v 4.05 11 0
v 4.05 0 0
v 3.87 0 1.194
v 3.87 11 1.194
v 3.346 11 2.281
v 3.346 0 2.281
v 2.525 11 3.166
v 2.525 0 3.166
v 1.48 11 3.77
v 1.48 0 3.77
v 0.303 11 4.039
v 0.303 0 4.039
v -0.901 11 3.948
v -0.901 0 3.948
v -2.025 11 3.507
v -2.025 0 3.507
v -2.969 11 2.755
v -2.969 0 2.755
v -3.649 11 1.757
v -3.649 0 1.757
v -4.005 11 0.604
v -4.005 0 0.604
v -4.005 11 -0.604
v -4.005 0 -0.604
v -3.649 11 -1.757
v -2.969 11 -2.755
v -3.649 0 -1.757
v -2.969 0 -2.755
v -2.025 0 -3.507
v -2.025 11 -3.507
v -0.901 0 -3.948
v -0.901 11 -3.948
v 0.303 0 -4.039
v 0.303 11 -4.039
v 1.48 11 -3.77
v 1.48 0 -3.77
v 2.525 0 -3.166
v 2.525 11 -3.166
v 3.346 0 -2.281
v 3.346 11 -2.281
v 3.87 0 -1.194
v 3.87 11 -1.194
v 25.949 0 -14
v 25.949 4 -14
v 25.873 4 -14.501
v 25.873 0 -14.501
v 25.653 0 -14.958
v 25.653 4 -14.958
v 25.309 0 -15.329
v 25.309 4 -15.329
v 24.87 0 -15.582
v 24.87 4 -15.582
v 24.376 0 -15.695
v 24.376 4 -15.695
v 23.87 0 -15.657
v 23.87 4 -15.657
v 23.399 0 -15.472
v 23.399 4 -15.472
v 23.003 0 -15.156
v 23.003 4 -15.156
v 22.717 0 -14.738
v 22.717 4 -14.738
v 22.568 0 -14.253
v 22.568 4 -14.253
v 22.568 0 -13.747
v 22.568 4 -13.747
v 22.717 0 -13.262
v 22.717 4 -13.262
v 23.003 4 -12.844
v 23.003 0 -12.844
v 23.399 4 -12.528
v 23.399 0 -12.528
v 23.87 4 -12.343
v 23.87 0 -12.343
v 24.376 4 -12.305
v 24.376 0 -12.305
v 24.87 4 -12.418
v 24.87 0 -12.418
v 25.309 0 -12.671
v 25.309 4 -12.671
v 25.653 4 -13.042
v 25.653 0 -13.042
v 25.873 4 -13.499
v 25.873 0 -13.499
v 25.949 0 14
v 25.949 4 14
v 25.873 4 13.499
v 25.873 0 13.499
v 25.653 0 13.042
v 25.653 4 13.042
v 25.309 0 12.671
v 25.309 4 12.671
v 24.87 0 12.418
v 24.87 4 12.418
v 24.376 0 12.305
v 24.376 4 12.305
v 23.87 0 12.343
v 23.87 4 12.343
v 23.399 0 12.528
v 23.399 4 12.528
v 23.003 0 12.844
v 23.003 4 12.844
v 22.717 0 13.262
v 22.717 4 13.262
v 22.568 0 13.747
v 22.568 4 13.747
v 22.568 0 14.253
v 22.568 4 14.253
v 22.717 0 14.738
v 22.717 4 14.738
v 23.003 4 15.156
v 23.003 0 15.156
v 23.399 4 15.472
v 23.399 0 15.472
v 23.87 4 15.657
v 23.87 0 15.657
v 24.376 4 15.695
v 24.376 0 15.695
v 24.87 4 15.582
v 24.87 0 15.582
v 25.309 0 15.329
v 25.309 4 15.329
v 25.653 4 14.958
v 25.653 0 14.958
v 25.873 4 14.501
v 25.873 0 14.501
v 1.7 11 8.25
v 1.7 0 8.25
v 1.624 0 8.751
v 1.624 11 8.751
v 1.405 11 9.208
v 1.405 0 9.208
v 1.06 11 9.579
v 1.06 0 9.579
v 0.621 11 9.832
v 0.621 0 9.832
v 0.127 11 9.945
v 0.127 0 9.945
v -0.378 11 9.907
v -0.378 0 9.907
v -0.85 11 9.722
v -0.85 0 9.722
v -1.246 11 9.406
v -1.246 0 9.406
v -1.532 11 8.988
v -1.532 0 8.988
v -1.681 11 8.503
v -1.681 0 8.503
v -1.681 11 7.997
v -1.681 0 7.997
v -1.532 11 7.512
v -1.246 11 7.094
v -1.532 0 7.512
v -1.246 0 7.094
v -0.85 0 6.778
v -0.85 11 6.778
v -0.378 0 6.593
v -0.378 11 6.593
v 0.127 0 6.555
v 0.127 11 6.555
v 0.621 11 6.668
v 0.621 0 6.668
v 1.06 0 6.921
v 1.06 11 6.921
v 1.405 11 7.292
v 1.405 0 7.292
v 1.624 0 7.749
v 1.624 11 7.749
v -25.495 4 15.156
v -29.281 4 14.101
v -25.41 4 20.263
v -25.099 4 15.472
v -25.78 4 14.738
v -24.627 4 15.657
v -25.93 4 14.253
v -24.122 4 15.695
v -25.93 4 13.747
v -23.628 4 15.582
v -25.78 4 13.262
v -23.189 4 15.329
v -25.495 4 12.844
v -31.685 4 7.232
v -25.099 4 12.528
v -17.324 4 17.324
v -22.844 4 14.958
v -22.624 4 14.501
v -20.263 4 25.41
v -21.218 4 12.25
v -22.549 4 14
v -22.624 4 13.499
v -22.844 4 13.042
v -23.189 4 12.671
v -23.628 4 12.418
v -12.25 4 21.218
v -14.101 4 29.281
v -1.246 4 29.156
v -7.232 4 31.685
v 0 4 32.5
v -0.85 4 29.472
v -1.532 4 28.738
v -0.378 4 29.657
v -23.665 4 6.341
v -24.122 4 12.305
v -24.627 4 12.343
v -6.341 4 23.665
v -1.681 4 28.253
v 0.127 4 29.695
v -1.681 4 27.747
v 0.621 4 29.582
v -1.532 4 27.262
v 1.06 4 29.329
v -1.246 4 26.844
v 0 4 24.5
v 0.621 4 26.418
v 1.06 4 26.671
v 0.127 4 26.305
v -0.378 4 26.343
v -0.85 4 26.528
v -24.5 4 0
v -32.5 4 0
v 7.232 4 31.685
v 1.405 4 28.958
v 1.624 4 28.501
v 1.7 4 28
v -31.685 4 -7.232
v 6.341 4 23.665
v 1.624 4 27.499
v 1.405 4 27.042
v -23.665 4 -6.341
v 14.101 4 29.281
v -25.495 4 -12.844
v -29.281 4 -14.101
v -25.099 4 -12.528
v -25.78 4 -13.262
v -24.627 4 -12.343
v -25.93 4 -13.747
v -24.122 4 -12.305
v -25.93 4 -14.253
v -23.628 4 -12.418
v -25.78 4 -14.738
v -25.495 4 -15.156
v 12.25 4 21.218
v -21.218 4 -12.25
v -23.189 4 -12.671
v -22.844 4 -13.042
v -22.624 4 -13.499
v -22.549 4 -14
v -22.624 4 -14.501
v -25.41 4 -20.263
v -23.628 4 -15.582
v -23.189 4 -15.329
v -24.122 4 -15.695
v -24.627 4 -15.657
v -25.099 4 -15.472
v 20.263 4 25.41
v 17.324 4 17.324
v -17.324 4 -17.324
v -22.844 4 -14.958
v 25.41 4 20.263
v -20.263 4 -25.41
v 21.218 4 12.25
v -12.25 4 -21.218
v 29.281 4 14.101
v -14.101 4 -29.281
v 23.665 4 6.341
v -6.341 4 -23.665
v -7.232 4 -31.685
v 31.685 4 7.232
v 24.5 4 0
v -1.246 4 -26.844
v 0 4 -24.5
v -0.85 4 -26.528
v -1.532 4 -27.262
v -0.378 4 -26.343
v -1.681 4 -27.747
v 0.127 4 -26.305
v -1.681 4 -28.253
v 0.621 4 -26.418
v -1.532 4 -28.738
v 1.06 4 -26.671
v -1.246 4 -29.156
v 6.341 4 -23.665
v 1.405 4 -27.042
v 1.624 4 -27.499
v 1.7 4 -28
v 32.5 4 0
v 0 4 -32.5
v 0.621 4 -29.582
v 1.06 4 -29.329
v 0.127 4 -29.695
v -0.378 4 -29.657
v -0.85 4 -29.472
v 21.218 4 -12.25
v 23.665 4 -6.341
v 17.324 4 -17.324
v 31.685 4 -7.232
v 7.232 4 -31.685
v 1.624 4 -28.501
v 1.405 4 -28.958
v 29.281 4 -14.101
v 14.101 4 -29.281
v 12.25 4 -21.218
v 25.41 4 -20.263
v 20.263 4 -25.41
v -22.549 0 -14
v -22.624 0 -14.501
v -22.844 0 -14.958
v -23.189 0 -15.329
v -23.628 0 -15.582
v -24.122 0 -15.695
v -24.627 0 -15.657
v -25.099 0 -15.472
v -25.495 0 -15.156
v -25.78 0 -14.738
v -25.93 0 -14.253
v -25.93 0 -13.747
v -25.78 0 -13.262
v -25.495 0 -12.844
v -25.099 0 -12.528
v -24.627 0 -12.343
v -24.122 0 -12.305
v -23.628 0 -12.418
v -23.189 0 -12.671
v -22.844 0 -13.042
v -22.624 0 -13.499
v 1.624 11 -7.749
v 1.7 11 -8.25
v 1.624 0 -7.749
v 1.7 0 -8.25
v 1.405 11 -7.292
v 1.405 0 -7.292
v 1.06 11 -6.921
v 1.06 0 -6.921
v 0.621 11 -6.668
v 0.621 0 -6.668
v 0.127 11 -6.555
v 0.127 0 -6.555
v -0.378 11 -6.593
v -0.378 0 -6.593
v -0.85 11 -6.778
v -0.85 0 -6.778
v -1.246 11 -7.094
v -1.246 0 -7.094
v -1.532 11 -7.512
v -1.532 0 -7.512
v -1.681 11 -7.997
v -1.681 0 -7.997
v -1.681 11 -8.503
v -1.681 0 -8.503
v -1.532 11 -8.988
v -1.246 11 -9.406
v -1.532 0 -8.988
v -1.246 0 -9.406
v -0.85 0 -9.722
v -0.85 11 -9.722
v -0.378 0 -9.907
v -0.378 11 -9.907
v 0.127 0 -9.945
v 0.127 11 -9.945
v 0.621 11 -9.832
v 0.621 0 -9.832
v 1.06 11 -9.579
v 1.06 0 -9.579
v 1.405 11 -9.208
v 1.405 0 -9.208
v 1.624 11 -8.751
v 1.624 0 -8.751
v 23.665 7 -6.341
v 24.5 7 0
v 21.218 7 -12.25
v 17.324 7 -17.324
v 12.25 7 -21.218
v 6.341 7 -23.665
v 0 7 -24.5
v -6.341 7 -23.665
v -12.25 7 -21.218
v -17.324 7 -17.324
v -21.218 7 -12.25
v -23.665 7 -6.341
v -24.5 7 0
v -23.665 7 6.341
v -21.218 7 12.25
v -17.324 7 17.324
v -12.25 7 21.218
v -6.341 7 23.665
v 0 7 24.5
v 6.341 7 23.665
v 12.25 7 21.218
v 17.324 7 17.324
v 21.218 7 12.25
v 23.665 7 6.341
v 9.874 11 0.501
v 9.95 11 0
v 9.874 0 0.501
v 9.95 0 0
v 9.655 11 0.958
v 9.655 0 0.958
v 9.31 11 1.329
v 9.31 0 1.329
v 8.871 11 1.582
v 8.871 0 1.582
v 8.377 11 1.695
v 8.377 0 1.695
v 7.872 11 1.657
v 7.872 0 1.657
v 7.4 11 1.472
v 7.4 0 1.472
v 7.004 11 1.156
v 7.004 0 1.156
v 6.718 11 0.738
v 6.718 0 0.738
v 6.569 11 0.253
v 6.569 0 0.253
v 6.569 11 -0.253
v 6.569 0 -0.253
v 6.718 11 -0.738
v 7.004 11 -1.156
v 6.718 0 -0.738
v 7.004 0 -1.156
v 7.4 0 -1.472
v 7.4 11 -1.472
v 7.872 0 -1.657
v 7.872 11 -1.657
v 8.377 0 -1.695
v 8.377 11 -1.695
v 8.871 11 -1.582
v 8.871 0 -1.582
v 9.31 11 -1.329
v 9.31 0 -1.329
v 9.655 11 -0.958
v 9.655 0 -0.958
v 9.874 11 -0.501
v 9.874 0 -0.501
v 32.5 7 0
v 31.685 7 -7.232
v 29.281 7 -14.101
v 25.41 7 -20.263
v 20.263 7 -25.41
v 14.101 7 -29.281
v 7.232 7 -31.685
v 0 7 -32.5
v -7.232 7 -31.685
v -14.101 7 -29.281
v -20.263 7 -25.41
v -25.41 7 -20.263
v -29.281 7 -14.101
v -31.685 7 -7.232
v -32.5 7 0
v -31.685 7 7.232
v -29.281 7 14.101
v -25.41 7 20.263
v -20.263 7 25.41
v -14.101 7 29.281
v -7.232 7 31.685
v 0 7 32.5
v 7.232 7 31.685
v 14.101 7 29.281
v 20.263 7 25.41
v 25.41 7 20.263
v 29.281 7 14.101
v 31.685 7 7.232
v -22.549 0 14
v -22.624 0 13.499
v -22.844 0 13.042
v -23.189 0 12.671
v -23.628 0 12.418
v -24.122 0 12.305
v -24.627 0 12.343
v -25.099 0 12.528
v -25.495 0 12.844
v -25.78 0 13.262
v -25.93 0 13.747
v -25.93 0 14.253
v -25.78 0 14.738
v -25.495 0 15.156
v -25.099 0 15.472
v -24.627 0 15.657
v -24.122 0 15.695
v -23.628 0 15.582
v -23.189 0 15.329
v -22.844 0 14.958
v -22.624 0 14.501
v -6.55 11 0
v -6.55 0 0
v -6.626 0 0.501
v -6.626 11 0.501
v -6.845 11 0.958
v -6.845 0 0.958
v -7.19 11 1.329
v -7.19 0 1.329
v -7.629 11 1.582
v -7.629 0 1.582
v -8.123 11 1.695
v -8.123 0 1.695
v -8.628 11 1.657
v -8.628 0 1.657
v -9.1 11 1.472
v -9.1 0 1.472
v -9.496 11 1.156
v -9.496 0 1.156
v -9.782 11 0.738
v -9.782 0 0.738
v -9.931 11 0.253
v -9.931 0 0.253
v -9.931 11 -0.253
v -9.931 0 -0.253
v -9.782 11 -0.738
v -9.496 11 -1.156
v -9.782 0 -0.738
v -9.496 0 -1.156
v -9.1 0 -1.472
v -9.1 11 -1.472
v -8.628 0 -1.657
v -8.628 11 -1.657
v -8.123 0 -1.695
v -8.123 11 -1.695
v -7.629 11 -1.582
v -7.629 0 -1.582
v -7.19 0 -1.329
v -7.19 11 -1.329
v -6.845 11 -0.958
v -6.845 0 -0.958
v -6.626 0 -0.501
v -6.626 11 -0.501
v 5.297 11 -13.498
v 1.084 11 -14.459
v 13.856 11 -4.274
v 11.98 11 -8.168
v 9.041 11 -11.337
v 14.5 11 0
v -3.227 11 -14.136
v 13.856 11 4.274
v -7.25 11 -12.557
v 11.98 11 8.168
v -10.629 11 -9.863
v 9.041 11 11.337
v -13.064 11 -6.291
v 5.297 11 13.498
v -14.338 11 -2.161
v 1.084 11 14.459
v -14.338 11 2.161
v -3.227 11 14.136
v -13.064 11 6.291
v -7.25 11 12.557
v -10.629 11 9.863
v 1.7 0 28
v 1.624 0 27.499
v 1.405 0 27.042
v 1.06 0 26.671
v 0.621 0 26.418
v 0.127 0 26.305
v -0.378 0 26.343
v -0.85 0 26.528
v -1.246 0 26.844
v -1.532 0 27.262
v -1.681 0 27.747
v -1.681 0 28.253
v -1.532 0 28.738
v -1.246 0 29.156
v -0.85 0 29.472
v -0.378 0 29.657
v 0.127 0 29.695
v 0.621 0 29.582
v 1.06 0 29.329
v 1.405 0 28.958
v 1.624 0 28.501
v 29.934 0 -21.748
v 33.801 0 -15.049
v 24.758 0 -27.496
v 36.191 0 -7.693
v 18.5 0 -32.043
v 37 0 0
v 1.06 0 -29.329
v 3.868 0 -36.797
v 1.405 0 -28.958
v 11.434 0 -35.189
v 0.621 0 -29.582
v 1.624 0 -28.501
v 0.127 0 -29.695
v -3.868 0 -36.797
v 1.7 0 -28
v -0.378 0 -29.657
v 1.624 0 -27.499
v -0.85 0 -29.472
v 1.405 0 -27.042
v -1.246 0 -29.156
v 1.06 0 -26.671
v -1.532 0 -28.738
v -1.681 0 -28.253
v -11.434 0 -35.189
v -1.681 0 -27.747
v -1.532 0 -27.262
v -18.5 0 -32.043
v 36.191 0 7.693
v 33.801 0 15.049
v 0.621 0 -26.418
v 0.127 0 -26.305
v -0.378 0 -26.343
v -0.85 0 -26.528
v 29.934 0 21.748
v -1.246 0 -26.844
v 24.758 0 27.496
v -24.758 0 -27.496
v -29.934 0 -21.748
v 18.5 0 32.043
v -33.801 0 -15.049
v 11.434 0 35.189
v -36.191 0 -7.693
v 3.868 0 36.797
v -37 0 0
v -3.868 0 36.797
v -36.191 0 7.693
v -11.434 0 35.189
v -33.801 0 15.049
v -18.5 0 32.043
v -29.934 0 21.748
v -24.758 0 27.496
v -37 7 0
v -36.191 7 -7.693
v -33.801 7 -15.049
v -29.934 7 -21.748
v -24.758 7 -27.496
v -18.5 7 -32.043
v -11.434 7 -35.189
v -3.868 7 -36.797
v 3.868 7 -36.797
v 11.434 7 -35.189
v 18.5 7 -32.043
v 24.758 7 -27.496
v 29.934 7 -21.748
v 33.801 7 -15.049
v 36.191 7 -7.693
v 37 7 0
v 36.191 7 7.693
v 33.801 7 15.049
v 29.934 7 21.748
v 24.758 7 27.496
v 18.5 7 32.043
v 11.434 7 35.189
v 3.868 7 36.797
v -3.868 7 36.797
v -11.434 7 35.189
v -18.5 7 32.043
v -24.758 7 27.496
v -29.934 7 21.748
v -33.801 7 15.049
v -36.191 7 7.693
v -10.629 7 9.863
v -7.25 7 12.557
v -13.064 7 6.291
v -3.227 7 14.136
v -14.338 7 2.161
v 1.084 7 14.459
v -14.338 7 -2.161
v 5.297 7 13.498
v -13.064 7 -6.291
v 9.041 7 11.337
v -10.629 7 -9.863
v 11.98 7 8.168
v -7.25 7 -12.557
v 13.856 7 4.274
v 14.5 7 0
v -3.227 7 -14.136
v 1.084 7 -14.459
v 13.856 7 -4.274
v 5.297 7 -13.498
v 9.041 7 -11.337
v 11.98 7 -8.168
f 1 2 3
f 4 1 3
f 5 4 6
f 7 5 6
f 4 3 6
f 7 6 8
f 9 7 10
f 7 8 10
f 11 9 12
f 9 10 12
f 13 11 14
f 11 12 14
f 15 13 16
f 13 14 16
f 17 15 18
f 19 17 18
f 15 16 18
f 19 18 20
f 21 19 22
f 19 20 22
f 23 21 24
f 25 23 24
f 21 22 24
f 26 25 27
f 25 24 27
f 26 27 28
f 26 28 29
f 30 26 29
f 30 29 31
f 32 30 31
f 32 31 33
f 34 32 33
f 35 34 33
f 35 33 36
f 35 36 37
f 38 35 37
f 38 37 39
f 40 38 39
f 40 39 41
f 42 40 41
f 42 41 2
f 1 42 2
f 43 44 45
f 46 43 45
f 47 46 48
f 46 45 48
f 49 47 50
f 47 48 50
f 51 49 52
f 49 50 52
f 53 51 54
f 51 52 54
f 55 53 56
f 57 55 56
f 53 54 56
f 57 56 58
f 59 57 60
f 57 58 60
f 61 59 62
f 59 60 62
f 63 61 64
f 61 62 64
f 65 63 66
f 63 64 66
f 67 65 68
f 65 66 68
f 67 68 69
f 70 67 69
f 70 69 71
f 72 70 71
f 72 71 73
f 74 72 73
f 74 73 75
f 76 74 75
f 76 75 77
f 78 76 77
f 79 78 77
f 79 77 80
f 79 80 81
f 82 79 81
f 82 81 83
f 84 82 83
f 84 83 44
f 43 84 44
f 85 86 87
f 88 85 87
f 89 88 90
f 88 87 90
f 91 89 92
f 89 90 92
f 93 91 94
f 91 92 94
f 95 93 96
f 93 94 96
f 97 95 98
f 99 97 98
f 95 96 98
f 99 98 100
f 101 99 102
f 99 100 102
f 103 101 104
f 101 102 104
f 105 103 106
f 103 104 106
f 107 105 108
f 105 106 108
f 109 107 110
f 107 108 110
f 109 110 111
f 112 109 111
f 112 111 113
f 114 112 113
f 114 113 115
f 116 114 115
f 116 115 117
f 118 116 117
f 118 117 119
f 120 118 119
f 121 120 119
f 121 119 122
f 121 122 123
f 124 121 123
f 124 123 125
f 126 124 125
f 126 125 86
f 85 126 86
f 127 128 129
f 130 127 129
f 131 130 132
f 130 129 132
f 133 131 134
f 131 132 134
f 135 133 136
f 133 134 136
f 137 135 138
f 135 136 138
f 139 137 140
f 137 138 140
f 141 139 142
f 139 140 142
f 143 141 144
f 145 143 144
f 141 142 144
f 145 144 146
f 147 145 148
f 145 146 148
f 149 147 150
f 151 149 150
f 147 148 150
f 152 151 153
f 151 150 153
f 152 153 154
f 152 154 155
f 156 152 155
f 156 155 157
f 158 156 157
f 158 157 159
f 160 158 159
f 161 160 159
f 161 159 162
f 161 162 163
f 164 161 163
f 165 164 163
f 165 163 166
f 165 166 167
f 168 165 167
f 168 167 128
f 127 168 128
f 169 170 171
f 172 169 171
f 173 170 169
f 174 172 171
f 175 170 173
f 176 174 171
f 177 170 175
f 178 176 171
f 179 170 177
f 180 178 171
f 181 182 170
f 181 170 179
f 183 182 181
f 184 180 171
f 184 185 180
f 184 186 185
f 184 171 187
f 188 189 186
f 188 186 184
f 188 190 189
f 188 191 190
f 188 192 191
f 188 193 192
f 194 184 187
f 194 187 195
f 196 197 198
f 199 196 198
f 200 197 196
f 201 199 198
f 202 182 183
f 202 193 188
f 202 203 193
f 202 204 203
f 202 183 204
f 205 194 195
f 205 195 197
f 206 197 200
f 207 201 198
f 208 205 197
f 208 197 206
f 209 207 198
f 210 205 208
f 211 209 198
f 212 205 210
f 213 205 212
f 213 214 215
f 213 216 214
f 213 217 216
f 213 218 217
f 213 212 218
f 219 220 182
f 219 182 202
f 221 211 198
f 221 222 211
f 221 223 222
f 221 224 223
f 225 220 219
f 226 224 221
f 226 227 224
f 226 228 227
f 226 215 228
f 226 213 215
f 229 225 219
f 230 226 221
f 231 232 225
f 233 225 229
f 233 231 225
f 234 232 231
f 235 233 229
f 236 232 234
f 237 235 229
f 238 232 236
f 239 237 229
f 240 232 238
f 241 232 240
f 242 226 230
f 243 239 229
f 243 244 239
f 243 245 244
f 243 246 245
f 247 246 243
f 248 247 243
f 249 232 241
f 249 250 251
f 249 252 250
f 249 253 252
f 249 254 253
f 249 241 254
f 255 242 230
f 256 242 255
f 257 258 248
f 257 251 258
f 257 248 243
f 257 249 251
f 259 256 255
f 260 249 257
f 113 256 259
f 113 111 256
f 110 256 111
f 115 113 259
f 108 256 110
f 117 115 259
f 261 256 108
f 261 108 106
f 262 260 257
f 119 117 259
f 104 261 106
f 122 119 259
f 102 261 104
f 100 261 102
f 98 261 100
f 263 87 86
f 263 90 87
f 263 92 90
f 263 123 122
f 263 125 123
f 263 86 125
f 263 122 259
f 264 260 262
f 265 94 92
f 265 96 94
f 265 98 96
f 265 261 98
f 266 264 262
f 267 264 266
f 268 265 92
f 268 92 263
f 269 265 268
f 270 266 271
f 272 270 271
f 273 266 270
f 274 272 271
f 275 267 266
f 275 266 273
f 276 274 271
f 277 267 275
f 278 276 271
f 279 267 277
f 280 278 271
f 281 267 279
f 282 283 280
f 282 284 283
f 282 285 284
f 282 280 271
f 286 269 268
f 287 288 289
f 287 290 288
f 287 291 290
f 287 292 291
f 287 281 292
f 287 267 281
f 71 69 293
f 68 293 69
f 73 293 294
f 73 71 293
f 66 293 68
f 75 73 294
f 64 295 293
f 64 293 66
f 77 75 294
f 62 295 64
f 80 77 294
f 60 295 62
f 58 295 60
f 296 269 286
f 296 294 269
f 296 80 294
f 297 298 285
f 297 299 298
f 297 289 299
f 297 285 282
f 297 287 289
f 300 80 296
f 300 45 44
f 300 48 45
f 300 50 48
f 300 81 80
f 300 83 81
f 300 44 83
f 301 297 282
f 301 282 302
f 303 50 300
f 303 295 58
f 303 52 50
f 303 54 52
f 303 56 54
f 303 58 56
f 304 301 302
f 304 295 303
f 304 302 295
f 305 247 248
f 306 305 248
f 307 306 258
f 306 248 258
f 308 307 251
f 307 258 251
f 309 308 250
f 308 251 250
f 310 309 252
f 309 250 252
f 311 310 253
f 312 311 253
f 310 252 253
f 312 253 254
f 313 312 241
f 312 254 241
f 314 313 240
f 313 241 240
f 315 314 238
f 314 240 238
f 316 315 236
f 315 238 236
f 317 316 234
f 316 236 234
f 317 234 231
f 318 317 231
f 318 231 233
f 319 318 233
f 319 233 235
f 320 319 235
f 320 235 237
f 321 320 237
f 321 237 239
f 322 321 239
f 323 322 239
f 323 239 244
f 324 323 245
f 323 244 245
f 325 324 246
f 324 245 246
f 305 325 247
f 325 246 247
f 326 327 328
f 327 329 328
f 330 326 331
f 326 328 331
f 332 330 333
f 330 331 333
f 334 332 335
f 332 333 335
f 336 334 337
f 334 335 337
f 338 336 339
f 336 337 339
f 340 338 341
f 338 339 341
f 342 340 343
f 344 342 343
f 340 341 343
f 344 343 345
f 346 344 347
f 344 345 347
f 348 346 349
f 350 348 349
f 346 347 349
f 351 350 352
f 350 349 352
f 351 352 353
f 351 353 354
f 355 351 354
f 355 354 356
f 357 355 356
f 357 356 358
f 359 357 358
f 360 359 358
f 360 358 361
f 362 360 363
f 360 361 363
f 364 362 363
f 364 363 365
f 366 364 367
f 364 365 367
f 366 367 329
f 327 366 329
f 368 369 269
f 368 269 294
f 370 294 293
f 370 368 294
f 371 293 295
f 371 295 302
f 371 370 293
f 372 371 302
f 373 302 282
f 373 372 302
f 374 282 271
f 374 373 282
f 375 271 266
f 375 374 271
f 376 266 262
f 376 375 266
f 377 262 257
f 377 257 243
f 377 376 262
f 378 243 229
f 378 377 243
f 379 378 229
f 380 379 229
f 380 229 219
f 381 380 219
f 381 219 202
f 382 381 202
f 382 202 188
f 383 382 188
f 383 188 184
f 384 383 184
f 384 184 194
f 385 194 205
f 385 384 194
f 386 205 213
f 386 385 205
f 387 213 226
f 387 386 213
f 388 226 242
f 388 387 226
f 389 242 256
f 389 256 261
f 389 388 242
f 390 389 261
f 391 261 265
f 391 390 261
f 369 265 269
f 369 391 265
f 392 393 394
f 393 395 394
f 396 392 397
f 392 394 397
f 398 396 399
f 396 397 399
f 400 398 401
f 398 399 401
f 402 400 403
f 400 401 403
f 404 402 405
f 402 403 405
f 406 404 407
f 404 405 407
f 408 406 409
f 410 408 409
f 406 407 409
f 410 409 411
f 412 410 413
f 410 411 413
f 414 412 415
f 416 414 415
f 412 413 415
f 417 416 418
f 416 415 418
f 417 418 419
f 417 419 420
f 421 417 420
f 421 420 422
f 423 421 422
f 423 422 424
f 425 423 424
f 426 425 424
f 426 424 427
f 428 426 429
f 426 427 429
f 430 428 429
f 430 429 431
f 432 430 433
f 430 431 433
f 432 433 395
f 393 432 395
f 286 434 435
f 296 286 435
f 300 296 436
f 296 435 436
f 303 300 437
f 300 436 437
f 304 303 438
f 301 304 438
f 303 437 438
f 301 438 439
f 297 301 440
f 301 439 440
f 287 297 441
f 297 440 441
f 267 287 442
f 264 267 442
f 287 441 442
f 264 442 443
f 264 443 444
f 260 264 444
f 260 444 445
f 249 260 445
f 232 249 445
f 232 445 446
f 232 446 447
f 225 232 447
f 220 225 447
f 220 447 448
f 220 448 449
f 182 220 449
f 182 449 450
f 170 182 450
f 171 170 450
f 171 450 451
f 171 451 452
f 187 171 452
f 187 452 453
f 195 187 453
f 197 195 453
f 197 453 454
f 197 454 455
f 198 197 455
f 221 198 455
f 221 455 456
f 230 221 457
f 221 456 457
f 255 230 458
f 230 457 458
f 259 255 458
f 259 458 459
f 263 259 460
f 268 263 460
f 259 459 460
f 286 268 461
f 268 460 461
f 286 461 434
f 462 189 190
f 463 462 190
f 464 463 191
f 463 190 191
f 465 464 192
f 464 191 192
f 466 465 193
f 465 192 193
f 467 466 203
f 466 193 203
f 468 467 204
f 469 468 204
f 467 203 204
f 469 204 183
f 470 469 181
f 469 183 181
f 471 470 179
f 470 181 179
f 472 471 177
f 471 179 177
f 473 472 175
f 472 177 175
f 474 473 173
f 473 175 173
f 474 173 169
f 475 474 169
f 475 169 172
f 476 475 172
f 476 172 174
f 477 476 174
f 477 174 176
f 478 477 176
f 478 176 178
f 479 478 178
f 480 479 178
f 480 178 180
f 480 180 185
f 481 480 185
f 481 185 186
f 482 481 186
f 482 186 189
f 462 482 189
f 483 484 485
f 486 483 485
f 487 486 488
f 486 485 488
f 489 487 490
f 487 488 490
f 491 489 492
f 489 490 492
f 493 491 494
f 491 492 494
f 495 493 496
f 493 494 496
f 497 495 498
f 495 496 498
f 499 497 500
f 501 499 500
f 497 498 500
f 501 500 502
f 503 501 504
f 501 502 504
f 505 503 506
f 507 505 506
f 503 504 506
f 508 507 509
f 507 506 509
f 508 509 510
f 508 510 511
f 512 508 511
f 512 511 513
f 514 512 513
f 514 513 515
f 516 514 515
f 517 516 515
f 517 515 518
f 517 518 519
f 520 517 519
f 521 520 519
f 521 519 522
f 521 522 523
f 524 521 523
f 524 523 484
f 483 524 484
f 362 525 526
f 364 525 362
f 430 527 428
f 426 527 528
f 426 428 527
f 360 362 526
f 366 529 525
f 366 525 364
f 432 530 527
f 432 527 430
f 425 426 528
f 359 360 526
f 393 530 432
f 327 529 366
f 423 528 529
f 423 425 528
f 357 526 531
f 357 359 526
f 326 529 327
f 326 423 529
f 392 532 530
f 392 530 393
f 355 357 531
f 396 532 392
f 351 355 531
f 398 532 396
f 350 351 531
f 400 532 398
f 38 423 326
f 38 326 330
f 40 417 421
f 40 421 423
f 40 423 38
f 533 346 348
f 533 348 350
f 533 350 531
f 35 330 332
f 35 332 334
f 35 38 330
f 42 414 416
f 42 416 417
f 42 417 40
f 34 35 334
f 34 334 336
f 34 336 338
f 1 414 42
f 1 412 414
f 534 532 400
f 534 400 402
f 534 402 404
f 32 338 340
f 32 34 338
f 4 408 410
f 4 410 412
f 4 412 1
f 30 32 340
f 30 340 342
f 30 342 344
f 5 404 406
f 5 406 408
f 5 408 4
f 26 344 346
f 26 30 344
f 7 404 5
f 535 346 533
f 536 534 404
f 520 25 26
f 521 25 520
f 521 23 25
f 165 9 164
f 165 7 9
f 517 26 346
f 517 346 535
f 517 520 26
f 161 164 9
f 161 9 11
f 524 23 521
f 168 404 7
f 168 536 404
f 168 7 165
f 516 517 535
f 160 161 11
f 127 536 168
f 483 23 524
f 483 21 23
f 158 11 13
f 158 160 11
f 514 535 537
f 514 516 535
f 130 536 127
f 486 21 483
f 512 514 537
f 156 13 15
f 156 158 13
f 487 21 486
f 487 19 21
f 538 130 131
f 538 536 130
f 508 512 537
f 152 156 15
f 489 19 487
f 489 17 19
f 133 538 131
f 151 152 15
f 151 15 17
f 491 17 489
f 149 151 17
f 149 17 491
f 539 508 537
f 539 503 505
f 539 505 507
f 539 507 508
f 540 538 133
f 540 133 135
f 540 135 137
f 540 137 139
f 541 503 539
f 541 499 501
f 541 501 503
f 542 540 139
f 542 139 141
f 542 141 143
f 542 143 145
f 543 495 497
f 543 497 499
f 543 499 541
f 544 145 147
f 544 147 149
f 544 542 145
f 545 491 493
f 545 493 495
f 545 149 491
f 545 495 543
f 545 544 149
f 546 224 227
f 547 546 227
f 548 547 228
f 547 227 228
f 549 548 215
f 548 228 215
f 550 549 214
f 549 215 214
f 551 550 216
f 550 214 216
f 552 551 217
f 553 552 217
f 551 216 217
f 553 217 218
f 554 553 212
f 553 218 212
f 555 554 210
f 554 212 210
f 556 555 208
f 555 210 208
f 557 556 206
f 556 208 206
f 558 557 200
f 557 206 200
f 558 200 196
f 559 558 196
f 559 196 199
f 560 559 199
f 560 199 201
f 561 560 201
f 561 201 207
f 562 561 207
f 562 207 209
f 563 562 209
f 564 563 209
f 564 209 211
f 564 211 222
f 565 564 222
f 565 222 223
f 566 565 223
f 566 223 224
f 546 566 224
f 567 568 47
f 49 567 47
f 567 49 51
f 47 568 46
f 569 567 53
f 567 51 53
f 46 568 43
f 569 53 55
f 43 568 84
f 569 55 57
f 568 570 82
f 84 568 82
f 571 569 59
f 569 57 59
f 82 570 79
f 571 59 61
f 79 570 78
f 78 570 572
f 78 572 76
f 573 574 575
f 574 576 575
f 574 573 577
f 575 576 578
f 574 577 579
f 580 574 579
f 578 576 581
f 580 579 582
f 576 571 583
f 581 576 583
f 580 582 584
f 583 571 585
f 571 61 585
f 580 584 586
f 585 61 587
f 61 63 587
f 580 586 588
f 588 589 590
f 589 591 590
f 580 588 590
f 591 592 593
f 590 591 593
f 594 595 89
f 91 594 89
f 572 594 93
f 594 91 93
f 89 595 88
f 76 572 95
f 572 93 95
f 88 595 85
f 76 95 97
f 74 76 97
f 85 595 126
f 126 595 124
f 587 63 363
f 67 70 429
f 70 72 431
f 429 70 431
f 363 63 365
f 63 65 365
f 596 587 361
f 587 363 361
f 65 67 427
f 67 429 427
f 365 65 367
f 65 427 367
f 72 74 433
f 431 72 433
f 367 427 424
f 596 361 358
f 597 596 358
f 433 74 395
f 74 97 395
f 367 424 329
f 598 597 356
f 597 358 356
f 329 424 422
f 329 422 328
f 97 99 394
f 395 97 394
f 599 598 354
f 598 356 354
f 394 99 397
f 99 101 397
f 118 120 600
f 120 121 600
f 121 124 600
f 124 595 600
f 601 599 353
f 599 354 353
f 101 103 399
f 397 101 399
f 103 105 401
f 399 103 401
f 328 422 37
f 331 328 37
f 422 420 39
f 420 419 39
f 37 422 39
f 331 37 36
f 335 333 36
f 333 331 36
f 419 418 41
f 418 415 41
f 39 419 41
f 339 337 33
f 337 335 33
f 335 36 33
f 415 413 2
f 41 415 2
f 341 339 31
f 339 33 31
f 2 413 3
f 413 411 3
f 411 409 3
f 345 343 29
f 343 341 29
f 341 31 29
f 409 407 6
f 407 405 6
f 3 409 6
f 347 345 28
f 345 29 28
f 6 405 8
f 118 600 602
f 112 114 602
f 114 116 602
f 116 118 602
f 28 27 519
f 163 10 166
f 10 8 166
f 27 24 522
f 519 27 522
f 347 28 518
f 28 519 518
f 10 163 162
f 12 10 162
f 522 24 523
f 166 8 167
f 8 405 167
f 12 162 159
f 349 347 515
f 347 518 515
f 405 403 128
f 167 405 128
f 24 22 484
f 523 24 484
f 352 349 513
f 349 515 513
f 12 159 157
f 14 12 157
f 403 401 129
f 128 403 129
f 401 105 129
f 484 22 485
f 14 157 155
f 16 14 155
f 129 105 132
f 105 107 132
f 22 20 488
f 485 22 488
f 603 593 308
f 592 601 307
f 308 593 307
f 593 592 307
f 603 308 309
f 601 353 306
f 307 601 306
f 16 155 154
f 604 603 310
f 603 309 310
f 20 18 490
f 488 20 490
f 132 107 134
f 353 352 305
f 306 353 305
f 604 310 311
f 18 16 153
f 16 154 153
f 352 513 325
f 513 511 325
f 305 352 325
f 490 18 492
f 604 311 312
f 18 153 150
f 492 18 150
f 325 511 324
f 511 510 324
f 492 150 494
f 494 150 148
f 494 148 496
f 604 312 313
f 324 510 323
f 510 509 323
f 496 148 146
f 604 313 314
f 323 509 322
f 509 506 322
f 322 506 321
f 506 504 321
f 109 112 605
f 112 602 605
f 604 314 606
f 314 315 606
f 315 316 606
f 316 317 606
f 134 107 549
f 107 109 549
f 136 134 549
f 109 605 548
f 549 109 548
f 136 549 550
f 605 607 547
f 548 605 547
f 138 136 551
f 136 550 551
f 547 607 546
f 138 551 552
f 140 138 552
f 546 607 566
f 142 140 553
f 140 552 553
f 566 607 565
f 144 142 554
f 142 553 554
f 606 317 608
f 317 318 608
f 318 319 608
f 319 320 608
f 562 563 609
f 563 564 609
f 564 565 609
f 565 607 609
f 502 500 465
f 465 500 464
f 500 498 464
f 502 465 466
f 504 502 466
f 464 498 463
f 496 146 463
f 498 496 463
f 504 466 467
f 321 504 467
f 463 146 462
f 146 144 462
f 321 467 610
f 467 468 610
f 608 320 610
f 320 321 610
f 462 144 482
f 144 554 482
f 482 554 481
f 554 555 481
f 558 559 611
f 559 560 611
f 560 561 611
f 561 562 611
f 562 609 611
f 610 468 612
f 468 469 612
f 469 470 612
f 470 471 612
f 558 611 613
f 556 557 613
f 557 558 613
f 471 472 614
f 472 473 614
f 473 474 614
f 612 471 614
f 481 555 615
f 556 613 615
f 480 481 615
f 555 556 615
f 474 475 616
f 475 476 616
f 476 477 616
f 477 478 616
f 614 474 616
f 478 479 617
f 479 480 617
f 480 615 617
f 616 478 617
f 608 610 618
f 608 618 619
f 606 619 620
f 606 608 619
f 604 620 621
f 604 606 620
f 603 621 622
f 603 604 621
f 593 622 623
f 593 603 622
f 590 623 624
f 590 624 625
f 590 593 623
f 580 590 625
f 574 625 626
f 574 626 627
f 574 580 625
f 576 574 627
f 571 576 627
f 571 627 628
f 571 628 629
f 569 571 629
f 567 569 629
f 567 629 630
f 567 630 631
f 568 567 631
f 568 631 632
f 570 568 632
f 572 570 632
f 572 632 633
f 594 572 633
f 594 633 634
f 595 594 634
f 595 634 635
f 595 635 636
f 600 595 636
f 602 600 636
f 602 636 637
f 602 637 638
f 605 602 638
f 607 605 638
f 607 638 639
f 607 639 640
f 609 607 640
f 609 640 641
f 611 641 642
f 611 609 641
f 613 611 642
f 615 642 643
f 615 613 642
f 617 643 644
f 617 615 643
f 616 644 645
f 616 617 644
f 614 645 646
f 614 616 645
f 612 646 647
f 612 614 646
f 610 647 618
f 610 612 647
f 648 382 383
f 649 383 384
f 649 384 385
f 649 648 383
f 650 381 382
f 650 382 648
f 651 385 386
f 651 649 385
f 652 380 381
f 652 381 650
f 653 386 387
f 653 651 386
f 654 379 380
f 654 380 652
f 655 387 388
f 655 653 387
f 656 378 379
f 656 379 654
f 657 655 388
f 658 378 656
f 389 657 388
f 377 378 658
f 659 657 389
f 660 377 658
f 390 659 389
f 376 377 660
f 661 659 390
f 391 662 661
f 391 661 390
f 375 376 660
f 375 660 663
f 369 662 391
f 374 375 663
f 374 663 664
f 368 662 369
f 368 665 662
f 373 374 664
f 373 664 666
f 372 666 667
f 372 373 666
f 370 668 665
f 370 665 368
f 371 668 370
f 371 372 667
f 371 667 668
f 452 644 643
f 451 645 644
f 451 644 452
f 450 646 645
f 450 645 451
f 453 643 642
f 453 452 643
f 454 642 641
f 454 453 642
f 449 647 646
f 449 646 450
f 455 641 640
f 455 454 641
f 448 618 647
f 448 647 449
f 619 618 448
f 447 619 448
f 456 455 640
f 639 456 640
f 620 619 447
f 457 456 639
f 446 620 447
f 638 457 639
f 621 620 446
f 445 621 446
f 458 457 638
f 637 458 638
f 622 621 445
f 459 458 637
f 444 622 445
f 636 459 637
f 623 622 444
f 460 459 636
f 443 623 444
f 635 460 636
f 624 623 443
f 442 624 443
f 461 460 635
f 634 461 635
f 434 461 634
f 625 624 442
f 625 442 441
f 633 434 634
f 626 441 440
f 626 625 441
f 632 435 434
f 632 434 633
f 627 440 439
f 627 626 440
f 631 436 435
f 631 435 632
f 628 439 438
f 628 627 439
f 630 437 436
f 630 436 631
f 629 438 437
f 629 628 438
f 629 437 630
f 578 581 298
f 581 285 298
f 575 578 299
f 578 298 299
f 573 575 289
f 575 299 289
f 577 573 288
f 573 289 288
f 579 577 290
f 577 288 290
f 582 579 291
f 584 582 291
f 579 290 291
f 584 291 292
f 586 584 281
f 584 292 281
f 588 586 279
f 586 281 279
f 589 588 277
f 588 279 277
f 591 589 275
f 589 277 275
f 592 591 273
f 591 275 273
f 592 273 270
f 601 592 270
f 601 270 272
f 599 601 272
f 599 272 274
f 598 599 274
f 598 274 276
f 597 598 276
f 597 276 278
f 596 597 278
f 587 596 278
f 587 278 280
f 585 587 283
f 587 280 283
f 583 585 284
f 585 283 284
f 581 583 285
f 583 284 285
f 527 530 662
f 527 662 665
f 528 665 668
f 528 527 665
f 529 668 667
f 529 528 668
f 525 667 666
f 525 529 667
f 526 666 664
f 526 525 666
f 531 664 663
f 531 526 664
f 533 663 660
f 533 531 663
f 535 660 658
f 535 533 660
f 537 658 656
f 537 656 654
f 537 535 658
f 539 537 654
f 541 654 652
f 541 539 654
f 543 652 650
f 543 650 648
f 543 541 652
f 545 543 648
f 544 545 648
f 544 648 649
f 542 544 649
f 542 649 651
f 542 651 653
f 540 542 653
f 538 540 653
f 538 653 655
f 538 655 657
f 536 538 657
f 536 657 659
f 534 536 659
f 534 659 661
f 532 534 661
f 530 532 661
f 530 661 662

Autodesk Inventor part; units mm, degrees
ref_plane "YZ Plane" through (0, 0, 0) normal (1, 0, 0) x (0, 1, 0)
ref_plane "XZ Plane" through (0, 0, 0) normal (0, 1, 0) x (-1, 0, 0)
ref_plane "XY Plane" through (0, 0, 0) normal (0, 0, 1) x (1, 0, 0)
sketch "Boceto1" plane through (0, 0, 0) normal (0, 1, 0) x (-1, 0, 0)
  circle A0 centre (0, 0) radius 37
  dimension "d0" = 74
extrude "Extrusión1" add sketch "Boceto1" along normal blind 11
sketch "Boceto3" plane through (0, 0, 0) normal (0, -1, 0) x (1, 0, 0)
  circle A0 centre (0, 0) radius 8.25
  circle A1 centre (0, 8.25) radius 1.7
  circle A2 centre (8.25, 0) radius 1.7
  circle A3 centre (-8.25, 0) radius 1.7
  circle A4 centre (0, -8.25) radius 1.7
  dimension "d7" = 3.4
  dimension "d8" = 16.5
extrude "Extrusión3" cut sketch "Boceto3" against normal through all contours A0 A2 | A0 A2 | A1 A0 | A0 A1 | A4 A0 | A0 A4 | A3 A0 | A0 A3
sketch "Boceto5" plane through (0, 0, 0) normal (0, -1, 0) x (1, 0, 0)
  circle A0 centre (0, 0) radius 4.05
  dimension "d13" = 8.1
extrude "Extrusión5" cut sketch "Boceto5" against normal through all
sketch "Boceto8" plane through (0, 11, 0) normal (0, 1, 0) x (1, 0, 0)
  circle A0 centre (0, 0) radius 24.5
  circle A1 centre (0, 0) radius 37
  dimension "d25" = 49
  dimension "d26" = 74
extrude "Extrusión8" cut sketch "Boceto8" against normal blind 4
sketch "Boceto14" plane through (0, 7, 0) normal (0, 1, 0) x (1, 0, 0)
  circle A0 centre (0, 0) radius 28
  circle A1 centre (0, 28) radius 1.7
  circle A2 centre (-24.2487, 14) radius 1.7
  circle A3 centre (-24.2487, -14) radius 1.7
  circle A4 centre (0, -28) radius 1.7
  circle A5 centre (24.2487, -14) radius 1.7
  circle A6 centre (24.2487, 14) radius 1.7
  point P0 (-1.6992, -27.9484)
  point P1 (1.6992, -27.9484)
  dimension "d50" = 56
  dimension "d51" = 3.4
  dimension "d54" = 360
extrude "Extrusión12" cut sketch "Boceto14" against normal through all contours A6 A0 | A0 A6 | A5 A0 | A0 A5 | A1 A0 | A0 A1 | A4 A0 | A0 A4 | A2 A0 | A0 A2 | A3 A0 | A0 A3
sketch "Boceto15" plane through (0, 7, 0) normal (0, 1, 0) x (1, 0, 0)
  circle A0 centre (24.2487, 14) radius 1.7 projected
  circle A1 centre (24.2487, 14) radius 3
  circle A2 centre (0, 28) radius 3
  circle A3 centre (-24.2487, 14) radius 3
  circle A4 centre (-24.2487, -14) radius 3
  circle A5 centre (0, -28) radius 3
  circle A6 centre (24.2487, -14) radius 3
  circle A7 centre (0, 0) radius 4.05 projected
  circle A8 centre (0, 0) radius 32.5
  circle A9 centre (0, 0) radius 24.5
  dimension "d58" = 6
  dimension "d61" = 360
  dimension "d63" = 65
extrude "Extrusión13" cut sketch "Boceto15" against normal blind 3 contours A0 | A1 | A2 | A3 | A4 | A5 | A6 | A8
sketch "Boceto16" plane through (0, 11, 0) normal (0, 1, 0) x (1, 0, 0)
  circle A0 centre (0, 0) radius 4.05 projected
  circle A1 centre (0, 0) radius 14.5
  circle A2 centre (0, 0) radius 37
  dimension "d66" = 29
extrude "Extrusión14" cut sketch "Boceto16" against normal blind 4 contours A2
equation "\"d1\" = Altura"
equation "\"Altura\" = 11"
properties part number "Joint - Primer segmento" material "Plastico PETG"
